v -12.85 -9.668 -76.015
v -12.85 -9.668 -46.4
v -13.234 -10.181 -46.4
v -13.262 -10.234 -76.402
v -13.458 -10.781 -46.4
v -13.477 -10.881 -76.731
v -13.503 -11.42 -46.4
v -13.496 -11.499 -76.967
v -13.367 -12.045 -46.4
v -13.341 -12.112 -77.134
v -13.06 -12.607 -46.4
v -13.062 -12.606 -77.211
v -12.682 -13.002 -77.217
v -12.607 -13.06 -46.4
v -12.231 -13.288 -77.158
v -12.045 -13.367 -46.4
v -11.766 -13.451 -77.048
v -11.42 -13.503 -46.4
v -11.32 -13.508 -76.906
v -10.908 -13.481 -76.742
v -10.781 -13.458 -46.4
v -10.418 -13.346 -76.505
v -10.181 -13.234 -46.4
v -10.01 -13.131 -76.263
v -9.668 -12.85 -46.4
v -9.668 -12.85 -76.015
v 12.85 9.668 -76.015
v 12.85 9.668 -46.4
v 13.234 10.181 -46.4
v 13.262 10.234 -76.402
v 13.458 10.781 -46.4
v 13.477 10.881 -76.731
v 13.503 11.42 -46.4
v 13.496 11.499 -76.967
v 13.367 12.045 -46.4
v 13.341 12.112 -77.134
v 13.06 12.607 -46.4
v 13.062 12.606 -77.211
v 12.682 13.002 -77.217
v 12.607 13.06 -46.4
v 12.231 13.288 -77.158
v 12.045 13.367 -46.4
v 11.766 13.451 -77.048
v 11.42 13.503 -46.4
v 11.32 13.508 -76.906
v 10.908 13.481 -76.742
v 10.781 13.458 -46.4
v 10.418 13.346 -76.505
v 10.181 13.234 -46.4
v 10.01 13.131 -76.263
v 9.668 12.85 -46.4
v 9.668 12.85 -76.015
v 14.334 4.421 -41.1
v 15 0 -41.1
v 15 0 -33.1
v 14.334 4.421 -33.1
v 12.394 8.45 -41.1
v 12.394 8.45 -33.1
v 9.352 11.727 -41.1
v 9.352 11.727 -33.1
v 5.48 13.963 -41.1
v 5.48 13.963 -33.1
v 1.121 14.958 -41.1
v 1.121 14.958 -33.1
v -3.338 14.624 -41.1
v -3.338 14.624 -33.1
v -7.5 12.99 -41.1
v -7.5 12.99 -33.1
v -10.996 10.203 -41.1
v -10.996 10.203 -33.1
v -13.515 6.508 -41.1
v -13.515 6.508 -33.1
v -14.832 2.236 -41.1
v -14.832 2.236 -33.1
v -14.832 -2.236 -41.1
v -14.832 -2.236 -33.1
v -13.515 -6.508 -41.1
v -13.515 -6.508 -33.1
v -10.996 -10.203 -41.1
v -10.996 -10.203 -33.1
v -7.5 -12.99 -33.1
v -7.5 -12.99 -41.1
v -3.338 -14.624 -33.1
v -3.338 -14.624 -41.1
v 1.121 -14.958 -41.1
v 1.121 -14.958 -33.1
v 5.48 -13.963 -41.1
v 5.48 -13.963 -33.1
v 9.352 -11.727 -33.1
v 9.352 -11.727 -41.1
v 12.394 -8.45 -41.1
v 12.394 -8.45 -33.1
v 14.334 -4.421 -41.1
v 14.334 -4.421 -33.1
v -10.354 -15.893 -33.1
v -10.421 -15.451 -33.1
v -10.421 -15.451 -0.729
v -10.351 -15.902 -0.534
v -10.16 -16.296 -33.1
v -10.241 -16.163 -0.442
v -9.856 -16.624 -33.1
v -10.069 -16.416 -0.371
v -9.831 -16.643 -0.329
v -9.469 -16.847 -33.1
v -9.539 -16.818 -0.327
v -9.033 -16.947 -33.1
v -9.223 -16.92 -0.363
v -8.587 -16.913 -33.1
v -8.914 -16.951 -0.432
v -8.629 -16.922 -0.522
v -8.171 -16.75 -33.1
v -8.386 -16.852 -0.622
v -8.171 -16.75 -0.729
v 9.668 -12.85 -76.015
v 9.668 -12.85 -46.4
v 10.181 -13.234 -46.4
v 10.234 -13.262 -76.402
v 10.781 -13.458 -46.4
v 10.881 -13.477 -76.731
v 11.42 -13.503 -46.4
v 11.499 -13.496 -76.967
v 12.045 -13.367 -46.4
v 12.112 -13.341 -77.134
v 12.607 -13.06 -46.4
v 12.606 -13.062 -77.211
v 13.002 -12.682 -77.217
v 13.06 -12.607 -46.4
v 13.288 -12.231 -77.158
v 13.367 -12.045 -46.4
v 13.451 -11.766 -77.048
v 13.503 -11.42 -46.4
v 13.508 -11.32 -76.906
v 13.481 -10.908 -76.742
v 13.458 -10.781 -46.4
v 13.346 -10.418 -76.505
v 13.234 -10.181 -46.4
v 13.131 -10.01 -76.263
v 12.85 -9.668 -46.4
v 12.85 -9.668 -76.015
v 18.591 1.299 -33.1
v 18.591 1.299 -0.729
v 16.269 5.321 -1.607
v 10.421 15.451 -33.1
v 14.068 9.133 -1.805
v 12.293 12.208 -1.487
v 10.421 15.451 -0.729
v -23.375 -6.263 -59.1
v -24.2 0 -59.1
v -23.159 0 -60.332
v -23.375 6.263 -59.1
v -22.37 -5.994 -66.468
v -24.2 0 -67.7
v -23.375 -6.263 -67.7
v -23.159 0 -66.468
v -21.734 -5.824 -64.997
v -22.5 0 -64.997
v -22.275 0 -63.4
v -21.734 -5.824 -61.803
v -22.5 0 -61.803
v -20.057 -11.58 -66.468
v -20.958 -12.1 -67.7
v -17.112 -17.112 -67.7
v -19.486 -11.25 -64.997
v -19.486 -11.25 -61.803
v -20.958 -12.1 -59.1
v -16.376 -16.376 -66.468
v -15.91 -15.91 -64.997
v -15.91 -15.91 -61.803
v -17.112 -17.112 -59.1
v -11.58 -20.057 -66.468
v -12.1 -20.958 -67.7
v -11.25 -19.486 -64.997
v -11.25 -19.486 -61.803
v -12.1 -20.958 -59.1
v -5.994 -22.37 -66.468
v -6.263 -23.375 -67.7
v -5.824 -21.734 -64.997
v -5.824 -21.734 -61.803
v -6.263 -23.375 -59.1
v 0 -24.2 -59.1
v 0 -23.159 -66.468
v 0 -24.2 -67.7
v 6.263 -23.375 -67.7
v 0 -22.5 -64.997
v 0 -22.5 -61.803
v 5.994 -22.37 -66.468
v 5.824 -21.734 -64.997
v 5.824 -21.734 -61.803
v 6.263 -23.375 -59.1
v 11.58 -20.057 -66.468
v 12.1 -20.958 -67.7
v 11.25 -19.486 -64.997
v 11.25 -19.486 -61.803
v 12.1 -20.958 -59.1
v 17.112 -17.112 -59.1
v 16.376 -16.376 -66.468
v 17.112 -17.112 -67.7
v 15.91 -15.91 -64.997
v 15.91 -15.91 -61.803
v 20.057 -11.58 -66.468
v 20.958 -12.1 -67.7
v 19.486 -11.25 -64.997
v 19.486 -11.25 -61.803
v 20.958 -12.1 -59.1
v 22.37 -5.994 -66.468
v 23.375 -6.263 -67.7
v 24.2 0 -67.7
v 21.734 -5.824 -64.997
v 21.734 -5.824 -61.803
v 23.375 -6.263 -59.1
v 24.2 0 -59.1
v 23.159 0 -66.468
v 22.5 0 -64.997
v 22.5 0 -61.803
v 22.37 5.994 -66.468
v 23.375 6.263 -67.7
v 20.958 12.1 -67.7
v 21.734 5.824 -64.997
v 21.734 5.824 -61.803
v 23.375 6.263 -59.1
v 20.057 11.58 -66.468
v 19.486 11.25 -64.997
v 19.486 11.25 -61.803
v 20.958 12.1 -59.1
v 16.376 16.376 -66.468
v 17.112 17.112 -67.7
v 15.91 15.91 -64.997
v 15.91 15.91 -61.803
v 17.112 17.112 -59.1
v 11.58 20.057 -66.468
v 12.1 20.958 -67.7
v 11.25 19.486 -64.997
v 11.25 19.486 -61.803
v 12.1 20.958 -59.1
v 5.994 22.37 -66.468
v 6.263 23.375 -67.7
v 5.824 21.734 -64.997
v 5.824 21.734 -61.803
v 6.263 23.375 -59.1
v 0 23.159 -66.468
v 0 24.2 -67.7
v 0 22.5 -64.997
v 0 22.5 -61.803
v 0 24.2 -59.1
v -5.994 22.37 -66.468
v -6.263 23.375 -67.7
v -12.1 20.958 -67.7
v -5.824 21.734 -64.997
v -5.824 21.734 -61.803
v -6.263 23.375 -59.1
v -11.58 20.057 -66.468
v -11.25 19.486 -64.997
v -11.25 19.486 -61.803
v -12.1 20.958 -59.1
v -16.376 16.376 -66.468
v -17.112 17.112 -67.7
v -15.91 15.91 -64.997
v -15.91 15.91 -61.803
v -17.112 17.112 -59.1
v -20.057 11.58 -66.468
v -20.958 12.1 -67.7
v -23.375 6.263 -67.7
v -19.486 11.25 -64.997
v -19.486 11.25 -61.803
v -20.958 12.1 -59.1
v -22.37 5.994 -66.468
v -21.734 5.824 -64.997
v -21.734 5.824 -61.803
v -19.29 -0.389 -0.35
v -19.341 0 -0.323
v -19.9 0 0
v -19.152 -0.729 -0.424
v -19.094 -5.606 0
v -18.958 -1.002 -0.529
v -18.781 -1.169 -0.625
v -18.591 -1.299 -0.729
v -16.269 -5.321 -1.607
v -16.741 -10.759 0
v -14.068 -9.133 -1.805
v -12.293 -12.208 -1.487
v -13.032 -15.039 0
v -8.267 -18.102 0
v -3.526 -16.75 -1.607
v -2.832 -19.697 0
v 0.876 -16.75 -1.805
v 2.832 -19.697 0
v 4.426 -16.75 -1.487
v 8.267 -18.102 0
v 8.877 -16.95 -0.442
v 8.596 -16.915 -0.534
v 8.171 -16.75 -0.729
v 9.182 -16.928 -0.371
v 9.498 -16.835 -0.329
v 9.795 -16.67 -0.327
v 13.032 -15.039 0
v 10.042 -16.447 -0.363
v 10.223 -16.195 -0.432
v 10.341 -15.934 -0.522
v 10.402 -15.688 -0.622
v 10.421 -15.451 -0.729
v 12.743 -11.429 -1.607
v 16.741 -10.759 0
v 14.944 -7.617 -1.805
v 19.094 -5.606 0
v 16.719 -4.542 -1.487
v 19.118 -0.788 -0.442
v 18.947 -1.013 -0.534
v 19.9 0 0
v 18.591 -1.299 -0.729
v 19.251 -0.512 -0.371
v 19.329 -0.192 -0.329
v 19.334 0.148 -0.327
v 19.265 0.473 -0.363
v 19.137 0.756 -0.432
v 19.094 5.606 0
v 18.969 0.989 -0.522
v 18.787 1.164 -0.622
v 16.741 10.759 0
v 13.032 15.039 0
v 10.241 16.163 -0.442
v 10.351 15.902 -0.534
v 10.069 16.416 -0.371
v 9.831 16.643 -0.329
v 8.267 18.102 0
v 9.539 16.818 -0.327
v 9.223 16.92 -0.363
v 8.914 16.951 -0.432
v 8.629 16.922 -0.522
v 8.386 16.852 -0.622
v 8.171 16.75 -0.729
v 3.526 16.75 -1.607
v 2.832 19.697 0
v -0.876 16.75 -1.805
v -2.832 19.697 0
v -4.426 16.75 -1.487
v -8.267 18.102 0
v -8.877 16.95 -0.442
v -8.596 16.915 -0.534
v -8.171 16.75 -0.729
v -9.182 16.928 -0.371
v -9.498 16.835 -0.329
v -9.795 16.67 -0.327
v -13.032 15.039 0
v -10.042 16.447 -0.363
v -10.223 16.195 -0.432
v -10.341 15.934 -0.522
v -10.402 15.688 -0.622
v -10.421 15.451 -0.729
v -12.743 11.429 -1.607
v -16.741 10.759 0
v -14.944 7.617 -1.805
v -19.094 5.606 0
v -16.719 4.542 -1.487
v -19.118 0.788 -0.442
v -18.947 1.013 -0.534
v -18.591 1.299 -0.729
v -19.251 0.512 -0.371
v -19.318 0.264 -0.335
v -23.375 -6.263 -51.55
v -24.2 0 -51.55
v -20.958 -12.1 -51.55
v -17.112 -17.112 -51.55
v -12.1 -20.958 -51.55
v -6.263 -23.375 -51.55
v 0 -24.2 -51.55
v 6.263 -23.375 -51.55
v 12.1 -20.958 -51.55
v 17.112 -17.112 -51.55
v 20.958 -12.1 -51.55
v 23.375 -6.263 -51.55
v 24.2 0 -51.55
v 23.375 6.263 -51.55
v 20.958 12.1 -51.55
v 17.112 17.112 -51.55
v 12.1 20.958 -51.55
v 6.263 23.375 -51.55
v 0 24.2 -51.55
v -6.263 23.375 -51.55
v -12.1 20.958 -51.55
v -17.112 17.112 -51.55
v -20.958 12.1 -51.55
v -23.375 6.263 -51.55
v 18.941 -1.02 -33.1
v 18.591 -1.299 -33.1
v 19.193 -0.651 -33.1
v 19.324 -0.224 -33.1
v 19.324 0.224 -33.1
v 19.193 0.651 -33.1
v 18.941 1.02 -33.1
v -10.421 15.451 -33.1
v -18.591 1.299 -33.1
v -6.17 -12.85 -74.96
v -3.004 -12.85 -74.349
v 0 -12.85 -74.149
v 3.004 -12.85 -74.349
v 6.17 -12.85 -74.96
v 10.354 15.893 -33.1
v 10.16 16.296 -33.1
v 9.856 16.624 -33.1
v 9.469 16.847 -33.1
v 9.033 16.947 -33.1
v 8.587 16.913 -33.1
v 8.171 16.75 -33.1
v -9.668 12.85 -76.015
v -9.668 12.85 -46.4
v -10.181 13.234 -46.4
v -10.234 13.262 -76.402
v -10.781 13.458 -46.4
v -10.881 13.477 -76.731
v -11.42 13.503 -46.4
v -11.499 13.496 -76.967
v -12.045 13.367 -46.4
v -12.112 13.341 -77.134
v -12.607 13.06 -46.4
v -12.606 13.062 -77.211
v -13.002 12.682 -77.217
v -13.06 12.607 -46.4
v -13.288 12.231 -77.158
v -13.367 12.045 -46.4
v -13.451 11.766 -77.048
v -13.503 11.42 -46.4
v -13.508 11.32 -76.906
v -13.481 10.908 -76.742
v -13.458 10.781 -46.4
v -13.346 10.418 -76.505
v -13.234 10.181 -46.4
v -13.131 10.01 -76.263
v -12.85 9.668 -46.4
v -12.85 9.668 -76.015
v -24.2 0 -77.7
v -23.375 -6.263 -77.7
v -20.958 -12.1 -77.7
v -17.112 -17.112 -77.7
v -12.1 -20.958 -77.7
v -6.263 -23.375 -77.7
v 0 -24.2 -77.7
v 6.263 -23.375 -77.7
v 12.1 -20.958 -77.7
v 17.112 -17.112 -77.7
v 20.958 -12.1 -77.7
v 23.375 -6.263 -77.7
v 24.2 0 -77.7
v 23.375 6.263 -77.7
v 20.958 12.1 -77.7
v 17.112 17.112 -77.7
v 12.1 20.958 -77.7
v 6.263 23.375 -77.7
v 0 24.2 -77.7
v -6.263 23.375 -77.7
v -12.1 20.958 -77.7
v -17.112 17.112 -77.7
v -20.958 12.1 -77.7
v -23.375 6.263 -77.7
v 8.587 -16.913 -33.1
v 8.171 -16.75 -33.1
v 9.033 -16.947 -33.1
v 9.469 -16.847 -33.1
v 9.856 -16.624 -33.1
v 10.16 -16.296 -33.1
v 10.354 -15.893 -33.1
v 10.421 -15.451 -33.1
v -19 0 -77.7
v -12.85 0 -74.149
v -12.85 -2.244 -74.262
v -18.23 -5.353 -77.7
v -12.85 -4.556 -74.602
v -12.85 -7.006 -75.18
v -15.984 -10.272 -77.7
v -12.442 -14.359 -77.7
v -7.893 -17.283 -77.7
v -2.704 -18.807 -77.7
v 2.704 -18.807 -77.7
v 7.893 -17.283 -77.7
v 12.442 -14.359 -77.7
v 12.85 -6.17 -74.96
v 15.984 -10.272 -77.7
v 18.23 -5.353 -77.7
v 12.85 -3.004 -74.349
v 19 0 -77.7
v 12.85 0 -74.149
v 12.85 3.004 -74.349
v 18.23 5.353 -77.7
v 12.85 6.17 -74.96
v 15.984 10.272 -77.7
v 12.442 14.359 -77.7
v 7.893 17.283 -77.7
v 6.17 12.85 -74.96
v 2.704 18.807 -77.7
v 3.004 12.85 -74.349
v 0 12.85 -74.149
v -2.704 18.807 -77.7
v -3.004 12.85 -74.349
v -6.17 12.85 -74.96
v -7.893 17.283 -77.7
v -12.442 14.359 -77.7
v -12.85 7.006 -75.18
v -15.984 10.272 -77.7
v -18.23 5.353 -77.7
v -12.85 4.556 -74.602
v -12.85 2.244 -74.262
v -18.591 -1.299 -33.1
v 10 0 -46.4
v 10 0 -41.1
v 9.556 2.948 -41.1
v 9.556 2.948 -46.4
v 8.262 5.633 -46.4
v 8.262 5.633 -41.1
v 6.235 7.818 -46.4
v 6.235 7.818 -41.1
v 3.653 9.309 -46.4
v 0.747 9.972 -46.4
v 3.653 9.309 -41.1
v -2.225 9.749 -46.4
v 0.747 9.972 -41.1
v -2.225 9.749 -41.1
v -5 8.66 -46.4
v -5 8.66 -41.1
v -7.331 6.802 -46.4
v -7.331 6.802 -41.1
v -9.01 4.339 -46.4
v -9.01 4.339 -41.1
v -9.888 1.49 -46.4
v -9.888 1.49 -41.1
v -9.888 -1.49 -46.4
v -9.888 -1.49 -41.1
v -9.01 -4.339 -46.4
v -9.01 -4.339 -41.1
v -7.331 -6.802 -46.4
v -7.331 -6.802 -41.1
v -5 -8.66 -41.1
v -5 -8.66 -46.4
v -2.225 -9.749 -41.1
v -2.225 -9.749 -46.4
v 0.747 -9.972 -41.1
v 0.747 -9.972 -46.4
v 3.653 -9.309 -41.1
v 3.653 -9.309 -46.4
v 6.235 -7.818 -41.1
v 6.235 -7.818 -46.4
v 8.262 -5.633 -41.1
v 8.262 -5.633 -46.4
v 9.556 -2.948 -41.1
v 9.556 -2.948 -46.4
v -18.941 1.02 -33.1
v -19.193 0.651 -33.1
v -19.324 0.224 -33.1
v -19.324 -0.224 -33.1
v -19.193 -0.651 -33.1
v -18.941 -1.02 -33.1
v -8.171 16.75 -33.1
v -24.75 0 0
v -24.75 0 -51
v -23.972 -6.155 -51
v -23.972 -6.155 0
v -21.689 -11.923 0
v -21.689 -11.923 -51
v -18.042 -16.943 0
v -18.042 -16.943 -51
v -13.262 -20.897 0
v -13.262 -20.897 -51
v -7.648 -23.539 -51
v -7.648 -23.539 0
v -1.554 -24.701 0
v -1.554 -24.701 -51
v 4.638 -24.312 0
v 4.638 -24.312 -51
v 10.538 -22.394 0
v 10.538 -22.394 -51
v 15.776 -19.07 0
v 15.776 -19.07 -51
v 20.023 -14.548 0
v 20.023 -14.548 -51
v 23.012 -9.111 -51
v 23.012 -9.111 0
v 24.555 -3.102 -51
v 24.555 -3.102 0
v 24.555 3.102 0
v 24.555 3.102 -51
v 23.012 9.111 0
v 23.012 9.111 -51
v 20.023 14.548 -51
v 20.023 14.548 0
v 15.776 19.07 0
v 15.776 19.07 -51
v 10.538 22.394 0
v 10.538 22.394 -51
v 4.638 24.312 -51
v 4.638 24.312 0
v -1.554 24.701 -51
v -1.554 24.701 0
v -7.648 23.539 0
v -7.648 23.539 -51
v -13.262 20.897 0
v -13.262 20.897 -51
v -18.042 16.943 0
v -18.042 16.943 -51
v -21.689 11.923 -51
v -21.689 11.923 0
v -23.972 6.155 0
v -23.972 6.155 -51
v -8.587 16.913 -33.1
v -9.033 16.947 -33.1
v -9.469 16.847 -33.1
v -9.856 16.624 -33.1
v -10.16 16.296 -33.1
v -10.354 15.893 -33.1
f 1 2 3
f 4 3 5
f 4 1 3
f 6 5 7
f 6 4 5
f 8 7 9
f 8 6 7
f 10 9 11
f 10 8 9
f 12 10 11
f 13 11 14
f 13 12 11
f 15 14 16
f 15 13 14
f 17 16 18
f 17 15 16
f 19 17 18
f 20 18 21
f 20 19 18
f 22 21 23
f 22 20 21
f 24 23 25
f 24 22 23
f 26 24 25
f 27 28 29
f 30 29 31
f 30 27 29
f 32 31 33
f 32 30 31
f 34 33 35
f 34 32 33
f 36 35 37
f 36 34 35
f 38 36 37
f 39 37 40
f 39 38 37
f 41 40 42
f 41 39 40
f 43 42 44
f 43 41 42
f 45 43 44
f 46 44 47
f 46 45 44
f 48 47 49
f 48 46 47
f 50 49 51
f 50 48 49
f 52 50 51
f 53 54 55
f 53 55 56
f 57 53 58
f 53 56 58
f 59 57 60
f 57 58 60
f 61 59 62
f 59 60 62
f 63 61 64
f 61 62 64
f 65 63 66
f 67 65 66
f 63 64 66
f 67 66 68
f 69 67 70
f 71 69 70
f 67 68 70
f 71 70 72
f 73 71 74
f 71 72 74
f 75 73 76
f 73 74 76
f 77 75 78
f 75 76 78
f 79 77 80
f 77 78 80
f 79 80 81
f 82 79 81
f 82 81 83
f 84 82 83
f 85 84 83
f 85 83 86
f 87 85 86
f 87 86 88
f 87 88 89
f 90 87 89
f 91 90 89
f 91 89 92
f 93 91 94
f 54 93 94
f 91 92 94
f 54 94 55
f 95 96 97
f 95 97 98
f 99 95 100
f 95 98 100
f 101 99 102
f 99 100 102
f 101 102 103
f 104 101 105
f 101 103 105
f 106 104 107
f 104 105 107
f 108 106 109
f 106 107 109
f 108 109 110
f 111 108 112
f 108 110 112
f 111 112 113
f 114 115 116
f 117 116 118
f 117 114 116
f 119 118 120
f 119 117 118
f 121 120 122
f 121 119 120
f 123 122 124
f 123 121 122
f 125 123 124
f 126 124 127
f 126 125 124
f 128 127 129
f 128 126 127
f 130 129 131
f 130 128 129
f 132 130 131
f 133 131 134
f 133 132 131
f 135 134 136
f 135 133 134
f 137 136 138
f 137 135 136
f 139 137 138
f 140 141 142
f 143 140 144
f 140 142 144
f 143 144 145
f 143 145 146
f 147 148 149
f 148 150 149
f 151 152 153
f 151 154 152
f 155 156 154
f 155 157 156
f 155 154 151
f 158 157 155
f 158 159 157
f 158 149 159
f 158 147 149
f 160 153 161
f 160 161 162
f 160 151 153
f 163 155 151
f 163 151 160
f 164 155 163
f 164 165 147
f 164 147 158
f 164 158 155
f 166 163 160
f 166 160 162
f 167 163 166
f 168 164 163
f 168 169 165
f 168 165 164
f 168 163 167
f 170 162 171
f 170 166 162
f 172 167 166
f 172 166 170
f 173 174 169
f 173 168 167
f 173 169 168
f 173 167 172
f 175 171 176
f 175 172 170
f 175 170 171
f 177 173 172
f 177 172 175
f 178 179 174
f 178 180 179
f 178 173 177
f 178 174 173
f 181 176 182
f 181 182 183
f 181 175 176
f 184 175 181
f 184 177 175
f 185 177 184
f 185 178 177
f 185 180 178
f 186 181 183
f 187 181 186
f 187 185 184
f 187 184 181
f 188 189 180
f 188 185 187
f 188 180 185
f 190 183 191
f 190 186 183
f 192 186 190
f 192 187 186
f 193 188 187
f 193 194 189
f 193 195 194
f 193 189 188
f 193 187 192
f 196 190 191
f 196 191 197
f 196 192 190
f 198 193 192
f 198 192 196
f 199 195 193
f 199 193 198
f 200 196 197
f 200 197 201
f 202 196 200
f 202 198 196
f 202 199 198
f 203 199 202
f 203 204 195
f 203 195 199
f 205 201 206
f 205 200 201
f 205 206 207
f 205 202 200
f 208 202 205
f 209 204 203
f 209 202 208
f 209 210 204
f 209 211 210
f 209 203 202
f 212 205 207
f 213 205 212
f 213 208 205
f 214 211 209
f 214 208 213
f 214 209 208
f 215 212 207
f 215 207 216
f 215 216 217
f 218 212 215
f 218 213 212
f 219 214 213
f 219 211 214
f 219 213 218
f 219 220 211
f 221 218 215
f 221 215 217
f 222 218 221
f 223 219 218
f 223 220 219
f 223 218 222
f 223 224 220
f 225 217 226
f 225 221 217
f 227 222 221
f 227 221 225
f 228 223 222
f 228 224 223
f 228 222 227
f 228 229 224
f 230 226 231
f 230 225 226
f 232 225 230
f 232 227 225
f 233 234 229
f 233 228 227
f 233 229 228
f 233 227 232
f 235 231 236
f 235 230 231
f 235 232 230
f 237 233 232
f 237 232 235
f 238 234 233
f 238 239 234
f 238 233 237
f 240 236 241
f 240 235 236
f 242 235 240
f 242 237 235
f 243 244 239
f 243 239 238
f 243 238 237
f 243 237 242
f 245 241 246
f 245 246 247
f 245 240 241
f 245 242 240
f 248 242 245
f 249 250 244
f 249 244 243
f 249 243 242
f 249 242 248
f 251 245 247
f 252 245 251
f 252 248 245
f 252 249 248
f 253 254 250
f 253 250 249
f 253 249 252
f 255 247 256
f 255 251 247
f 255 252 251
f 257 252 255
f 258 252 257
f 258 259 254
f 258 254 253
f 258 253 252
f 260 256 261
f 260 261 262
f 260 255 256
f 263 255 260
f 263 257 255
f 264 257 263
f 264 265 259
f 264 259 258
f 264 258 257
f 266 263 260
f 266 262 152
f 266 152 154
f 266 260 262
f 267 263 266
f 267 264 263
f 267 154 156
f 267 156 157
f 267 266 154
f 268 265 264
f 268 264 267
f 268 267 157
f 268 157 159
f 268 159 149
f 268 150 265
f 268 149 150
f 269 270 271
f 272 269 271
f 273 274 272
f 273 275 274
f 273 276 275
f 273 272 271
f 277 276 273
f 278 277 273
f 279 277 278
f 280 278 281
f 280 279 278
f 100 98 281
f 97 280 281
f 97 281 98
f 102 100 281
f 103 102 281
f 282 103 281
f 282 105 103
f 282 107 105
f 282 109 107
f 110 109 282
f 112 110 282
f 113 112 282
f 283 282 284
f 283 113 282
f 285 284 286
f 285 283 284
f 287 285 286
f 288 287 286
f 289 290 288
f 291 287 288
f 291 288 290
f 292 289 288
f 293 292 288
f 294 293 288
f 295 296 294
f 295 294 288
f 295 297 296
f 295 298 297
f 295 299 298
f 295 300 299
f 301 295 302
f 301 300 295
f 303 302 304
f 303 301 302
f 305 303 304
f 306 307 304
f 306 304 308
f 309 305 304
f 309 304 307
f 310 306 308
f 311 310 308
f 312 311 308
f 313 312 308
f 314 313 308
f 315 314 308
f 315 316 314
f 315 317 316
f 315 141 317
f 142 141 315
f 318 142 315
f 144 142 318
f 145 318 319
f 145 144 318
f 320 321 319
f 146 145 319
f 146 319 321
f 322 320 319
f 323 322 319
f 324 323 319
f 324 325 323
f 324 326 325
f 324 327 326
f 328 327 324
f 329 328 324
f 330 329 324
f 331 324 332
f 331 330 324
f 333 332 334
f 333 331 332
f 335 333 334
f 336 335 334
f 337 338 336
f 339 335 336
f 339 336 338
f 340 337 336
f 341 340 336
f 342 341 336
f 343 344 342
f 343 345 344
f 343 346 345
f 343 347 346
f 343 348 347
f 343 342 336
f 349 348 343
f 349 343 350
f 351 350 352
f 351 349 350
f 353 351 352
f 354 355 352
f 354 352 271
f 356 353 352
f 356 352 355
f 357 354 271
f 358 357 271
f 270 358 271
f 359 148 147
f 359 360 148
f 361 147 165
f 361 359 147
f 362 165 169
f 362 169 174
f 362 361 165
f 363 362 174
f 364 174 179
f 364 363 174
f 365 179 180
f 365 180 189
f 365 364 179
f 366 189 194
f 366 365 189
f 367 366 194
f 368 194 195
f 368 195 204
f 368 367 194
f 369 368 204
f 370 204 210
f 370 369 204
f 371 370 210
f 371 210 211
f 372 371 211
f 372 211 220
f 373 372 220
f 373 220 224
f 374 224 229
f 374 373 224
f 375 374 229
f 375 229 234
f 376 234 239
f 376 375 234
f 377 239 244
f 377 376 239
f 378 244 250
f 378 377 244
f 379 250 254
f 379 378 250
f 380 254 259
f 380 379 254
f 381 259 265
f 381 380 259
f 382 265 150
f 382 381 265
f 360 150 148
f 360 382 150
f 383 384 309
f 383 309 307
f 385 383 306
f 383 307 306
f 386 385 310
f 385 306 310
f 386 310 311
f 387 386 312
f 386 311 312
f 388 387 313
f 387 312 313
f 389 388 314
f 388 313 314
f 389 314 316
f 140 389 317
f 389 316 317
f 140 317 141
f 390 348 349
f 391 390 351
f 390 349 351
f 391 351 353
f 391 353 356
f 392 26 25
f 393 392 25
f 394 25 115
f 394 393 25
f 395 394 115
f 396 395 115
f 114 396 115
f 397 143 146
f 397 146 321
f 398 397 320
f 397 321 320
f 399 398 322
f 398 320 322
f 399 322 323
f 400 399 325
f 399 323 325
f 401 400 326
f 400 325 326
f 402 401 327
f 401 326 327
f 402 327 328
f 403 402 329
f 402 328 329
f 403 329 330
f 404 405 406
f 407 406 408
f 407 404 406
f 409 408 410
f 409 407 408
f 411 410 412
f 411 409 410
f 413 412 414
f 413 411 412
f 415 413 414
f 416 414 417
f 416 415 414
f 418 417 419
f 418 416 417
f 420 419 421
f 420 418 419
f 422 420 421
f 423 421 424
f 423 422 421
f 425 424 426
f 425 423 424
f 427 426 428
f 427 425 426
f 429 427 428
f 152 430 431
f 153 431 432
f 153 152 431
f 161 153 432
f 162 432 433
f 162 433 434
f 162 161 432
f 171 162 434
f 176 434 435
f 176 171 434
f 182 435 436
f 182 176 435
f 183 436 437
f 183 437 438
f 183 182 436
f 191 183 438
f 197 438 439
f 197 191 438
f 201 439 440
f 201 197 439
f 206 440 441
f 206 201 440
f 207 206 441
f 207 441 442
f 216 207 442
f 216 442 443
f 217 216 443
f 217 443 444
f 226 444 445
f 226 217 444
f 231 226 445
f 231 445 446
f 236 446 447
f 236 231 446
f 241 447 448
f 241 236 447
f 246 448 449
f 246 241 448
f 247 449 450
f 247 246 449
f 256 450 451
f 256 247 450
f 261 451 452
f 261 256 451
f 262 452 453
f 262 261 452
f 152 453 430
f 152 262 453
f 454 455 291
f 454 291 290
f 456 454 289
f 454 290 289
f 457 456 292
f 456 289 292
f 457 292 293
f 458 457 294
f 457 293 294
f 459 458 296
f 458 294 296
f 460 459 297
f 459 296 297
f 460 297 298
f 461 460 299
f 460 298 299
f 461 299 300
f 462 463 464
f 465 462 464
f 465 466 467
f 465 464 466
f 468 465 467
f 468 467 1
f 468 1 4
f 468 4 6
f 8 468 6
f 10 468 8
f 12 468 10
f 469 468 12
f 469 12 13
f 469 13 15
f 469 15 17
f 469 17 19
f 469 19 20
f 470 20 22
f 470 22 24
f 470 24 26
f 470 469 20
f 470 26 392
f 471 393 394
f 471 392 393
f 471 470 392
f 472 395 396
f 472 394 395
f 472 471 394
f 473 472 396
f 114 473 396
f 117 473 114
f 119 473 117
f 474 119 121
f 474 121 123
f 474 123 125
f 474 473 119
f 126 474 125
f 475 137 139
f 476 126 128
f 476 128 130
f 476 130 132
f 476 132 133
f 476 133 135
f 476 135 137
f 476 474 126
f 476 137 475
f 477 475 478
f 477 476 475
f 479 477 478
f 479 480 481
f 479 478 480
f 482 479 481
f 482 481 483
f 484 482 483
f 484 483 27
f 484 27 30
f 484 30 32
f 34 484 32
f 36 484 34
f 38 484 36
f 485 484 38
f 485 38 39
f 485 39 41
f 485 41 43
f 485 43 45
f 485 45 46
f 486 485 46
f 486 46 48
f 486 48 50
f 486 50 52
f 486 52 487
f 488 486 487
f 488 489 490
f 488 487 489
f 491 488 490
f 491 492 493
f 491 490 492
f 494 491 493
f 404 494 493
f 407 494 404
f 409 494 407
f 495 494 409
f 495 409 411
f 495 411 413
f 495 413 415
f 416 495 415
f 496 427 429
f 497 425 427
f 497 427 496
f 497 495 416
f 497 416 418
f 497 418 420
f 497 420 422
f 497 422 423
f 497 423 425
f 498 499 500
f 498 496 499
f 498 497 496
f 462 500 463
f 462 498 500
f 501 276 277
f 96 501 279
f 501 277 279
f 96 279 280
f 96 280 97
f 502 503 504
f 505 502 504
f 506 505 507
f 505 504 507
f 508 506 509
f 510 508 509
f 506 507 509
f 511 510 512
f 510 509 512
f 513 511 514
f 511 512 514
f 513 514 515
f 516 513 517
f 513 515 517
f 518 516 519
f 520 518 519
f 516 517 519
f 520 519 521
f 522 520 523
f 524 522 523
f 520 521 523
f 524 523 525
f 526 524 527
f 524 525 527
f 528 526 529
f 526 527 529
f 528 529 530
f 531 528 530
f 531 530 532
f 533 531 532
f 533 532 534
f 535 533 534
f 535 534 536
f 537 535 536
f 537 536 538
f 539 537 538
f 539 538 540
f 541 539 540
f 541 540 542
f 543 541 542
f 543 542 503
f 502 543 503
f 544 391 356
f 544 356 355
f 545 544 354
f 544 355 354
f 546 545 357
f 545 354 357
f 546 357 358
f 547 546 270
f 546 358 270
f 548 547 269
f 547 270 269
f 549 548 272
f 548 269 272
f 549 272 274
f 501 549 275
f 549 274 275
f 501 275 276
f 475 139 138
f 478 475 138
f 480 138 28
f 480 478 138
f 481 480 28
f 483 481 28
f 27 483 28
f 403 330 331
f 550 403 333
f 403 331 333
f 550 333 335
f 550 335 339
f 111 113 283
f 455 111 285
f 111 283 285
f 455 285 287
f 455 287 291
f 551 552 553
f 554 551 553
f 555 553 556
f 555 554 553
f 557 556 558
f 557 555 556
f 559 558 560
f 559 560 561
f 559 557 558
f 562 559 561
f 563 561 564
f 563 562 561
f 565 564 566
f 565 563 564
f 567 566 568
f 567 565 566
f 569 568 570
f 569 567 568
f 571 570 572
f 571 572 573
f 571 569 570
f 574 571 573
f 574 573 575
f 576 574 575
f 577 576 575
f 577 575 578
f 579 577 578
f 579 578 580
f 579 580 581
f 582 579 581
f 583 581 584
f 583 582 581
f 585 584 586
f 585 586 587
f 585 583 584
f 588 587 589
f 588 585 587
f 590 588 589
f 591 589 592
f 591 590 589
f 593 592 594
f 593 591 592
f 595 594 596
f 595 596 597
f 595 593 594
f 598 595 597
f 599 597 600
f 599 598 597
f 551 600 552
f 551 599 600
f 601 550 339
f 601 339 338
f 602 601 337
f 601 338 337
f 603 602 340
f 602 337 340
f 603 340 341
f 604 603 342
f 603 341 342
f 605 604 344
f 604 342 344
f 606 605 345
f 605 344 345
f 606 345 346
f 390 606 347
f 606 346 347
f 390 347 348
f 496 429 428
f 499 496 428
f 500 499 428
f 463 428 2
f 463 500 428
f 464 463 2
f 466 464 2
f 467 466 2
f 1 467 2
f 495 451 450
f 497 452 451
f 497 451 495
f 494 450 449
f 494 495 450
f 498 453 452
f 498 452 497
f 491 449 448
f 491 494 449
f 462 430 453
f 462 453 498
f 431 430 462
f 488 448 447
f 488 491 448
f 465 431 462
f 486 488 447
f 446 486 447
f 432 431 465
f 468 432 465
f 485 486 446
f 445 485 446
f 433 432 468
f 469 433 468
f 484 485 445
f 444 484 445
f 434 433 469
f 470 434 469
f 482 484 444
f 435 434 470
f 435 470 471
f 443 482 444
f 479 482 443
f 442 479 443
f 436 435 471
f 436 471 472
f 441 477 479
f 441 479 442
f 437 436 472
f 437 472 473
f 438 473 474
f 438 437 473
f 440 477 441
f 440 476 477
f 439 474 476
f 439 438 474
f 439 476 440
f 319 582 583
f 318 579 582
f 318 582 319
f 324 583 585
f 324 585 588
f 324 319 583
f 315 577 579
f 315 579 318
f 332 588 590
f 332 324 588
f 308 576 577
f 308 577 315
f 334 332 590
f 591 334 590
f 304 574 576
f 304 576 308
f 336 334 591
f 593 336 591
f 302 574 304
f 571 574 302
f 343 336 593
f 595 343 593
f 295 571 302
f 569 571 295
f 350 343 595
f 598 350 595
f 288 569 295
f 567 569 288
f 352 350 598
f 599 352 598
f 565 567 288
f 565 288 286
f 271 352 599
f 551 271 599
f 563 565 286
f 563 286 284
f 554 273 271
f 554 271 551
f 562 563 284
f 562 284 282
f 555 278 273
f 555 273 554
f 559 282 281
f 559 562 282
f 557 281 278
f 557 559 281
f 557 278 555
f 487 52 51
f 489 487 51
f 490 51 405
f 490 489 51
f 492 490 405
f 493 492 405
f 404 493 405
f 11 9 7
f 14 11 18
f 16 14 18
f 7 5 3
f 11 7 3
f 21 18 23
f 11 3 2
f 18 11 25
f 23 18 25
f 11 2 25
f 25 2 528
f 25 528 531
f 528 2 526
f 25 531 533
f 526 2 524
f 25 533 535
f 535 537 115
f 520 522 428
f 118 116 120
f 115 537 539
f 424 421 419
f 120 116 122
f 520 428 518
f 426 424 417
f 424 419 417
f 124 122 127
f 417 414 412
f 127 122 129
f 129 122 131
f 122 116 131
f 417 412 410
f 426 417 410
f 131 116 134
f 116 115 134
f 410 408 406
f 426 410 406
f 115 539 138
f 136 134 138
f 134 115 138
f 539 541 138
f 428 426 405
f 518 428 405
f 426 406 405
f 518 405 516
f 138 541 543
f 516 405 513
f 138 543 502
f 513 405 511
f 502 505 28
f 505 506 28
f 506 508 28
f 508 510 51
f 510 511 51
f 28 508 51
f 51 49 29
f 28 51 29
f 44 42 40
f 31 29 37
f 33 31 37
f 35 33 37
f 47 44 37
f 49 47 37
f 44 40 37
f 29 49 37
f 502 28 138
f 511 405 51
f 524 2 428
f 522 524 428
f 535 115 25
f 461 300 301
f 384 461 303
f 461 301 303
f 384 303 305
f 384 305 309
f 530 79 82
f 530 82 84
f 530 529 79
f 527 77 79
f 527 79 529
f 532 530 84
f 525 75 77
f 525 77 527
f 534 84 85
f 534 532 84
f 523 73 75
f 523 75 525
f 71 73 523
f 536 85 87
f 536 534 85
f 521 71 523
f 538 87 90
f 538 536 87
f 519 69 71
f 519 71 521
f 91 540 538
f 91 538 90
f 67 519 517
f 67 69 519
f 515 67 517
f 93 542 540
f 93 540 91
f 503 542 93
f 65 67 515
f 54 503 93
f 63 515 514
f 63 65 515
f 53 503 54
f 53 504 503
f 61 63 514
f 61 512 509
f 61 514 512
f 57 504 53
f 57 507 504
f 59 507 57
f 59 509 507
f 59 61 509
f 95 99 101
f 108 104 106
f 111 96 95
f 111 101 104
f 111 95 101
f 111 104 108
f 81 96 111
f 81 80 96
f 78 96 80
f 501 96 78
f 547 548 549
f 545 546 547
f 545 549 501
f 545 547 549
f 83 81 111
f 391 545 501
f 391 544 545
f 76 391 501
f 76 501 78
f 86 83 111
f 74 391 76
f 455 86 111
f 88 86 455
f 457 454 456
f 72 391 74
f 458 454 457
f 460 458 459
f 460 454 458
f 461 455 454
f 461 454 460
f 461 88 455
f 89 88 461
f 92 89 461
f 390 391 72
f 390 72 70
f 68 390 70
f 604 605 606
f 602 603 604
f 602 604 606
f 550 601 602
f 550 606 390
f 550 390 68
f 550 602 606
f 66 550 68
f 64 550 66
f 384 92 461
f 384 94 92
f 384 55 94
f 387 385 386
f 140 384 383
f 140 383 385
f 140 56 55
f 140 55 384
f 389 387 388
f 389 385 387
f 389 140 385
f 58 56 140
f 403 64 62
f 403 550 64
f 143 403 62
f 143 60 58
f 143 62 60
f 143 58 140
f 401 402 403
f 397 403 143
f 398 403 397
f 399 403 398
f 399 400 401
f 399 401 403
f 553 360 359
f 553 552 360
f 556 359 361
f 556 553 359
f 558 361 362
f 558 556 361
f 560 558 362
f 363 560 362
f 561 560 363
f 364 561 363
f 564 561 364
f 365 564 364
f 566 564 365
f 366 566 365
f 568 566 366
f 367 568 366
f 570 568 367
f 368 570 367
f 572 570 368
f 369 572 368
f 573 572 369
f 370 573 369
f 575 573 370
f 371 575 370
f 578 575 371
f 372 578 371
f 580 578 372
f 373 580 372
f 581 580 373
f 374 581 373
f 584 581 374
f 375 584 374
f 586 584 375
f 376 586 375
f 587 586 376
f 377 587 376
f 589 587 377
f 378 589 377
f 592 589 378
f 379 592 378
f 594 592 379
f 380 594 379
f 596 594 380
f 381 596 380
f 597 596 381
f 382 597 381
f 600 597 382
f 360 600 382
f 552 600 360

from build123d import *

# Parameters (mm, degrees)
CUT_EXTRUDE1_DEPTH = 33.1
SKETCH3_R          = 10
CUT_EXTRUDE2_DEPTH = 30
CUT_EXTRUDE3_DEPTH = 31.3
SKETCH5_R          = 15
CUT_EXTRUDE4_DEPTH = 8


with BuildPart() as part:
    # Sketch1 → Revolve1 (revolve)
    with BuildSketch(Plane(origin=(0, 0, 0), x_dir=(0, 0, -1), z_dir=(1, 0, 0)), mode=Mode.PRIVATE) as revolve1_sk:
        with BuildLine():
            Line((0, 24.75), (0, 19.9))
            Line((0, 19.9), (11.489270357, 0))
            Line((11.489270357, 0), (66.730344885, 0))
            Line((66.730344885, 0), (77.7, 19))
            Line((77.7, 19), (77.7, 24.2))
            Line((77.7, 24.2), (67.7, 24.2))
            ThreePointArc((67.7, 24.2), (63.4, 22.275), (59.1, 24.2))
            Line((59.1, 24.2), (51.55, 24.2))
            Line((51.55, 24.2), (51, 24.75))
            Line((51, 24.75), (0, 24.75))
        make_face()
    revolve(revolve1_sk.sketch.rotate(Axis((0, 0, 0), (0, 0, 1)), 90), axis=Axis((0, 0, 0), (0, 0, 1)))

    # Sketch2 → Cut-Extrude1 (cut)
    with BuildSketch(Plane.XY):
        with BuildLine():
            Line((-10.420617009, 15.450961894), (-18.591234018, 1.299038106))
            ThreePointArc((-18.591234018, 1.299038106), (-19.341234018, 0), (-18.591234018, -1.299038106))
            Line((-18.591234018, -1.299038106), (-10.420617009, -15.450961894))
            ThreePointArc((-10.420617009, -15.450961894), (-9.670617009, -16.75), (-8.170617009, -16.75))
            Line((-8.170617009, -16.75), (8.170617009, -16.75))
            ThreePointArc((8.170617009, -16.75), (9.670617009, -16.75), (10.420617009, -15.450961894))
            Line((10.420617009, -15.450961894), (18.591234018, -1.299038106))
            ThreePointArc((18.591234018, -1.299038106), (19.341234018, 0), (18.591234018, 1.299038106))
            Line((18.591234018, 1.299038106), (10.420617009, 15.450961894))
            ThreePointArc((10.420617009, 15.450961894), (9.670617009, 16.75), (8.170617009, 16.75))
            Line((8.170617009, 16.75), (-8.170617009, 16.75))
            ThreePointArc((-8.170617009, 16.75), (-9.670617009, 16.75), (-10.420617009, 15.450961894))
        make_face()
    extrude(amount=-CUT_EXTRUDE1_DEPTH, mode=Mode.SUBTRACT)

    # Sketch3 → Cut-Extrude2 (cut)
    with BuildSketch(Plane.XY.offset(-33.1)):
        Circle(SKETCH3_R)
    extrude(amount=-CUT_EXTRUDE2_DEPTH, mode=Mode.SUBTRACT)

    # Sketch4 → Cut-Extrude3 (cut)
    with BuildSketch(Plane(origin=(0, 0, -77.7), x_dir=(-1, 0, 0), z_dir=(0, 0, -1))):
        with BuildLine():
            Line((-12.85, -9.668019485), (-12.85, 9.668019485))
            ThreePointArc((-12.85, 9.668019485), (-12.85, 12.85), (-9.668019485, 12.85))
            Line((-9.668019485, 12.85), (9.668019485, 12.85))
            ThreePointArc((9.668019485, 12.85), (12.85, 12.85), (12.85, 9.668019485))
            Line((12.85, 9.668019485), (12.85, -9.668019485))
            ThreePointArc((12.85, -9.668019485), (12.85, -12.85), (9.668019485, -12.85))
            Line((9.668019485, -12.85), (-9.668019485, -12.85))
            ThreePointArc((-9.668019485, -12.85), (-12.85, -12.85), (-12.85, -9.668019485))
        make_face()
    extrude(amount=-CUT_EXTRUDE3_DEPTH, mode=Mode.SUBTRACT)

    # Sketch5 → Cut-Extrude4 (cut)
    with BuildSketch(Plane.XY.offset(-33.1)):
        Circle(SKETCH5_R)
    extrude(amount=-CUT_EXTRUDE4_DEPTH, mode=Mode.SUBTRACT)


solid = part.part
